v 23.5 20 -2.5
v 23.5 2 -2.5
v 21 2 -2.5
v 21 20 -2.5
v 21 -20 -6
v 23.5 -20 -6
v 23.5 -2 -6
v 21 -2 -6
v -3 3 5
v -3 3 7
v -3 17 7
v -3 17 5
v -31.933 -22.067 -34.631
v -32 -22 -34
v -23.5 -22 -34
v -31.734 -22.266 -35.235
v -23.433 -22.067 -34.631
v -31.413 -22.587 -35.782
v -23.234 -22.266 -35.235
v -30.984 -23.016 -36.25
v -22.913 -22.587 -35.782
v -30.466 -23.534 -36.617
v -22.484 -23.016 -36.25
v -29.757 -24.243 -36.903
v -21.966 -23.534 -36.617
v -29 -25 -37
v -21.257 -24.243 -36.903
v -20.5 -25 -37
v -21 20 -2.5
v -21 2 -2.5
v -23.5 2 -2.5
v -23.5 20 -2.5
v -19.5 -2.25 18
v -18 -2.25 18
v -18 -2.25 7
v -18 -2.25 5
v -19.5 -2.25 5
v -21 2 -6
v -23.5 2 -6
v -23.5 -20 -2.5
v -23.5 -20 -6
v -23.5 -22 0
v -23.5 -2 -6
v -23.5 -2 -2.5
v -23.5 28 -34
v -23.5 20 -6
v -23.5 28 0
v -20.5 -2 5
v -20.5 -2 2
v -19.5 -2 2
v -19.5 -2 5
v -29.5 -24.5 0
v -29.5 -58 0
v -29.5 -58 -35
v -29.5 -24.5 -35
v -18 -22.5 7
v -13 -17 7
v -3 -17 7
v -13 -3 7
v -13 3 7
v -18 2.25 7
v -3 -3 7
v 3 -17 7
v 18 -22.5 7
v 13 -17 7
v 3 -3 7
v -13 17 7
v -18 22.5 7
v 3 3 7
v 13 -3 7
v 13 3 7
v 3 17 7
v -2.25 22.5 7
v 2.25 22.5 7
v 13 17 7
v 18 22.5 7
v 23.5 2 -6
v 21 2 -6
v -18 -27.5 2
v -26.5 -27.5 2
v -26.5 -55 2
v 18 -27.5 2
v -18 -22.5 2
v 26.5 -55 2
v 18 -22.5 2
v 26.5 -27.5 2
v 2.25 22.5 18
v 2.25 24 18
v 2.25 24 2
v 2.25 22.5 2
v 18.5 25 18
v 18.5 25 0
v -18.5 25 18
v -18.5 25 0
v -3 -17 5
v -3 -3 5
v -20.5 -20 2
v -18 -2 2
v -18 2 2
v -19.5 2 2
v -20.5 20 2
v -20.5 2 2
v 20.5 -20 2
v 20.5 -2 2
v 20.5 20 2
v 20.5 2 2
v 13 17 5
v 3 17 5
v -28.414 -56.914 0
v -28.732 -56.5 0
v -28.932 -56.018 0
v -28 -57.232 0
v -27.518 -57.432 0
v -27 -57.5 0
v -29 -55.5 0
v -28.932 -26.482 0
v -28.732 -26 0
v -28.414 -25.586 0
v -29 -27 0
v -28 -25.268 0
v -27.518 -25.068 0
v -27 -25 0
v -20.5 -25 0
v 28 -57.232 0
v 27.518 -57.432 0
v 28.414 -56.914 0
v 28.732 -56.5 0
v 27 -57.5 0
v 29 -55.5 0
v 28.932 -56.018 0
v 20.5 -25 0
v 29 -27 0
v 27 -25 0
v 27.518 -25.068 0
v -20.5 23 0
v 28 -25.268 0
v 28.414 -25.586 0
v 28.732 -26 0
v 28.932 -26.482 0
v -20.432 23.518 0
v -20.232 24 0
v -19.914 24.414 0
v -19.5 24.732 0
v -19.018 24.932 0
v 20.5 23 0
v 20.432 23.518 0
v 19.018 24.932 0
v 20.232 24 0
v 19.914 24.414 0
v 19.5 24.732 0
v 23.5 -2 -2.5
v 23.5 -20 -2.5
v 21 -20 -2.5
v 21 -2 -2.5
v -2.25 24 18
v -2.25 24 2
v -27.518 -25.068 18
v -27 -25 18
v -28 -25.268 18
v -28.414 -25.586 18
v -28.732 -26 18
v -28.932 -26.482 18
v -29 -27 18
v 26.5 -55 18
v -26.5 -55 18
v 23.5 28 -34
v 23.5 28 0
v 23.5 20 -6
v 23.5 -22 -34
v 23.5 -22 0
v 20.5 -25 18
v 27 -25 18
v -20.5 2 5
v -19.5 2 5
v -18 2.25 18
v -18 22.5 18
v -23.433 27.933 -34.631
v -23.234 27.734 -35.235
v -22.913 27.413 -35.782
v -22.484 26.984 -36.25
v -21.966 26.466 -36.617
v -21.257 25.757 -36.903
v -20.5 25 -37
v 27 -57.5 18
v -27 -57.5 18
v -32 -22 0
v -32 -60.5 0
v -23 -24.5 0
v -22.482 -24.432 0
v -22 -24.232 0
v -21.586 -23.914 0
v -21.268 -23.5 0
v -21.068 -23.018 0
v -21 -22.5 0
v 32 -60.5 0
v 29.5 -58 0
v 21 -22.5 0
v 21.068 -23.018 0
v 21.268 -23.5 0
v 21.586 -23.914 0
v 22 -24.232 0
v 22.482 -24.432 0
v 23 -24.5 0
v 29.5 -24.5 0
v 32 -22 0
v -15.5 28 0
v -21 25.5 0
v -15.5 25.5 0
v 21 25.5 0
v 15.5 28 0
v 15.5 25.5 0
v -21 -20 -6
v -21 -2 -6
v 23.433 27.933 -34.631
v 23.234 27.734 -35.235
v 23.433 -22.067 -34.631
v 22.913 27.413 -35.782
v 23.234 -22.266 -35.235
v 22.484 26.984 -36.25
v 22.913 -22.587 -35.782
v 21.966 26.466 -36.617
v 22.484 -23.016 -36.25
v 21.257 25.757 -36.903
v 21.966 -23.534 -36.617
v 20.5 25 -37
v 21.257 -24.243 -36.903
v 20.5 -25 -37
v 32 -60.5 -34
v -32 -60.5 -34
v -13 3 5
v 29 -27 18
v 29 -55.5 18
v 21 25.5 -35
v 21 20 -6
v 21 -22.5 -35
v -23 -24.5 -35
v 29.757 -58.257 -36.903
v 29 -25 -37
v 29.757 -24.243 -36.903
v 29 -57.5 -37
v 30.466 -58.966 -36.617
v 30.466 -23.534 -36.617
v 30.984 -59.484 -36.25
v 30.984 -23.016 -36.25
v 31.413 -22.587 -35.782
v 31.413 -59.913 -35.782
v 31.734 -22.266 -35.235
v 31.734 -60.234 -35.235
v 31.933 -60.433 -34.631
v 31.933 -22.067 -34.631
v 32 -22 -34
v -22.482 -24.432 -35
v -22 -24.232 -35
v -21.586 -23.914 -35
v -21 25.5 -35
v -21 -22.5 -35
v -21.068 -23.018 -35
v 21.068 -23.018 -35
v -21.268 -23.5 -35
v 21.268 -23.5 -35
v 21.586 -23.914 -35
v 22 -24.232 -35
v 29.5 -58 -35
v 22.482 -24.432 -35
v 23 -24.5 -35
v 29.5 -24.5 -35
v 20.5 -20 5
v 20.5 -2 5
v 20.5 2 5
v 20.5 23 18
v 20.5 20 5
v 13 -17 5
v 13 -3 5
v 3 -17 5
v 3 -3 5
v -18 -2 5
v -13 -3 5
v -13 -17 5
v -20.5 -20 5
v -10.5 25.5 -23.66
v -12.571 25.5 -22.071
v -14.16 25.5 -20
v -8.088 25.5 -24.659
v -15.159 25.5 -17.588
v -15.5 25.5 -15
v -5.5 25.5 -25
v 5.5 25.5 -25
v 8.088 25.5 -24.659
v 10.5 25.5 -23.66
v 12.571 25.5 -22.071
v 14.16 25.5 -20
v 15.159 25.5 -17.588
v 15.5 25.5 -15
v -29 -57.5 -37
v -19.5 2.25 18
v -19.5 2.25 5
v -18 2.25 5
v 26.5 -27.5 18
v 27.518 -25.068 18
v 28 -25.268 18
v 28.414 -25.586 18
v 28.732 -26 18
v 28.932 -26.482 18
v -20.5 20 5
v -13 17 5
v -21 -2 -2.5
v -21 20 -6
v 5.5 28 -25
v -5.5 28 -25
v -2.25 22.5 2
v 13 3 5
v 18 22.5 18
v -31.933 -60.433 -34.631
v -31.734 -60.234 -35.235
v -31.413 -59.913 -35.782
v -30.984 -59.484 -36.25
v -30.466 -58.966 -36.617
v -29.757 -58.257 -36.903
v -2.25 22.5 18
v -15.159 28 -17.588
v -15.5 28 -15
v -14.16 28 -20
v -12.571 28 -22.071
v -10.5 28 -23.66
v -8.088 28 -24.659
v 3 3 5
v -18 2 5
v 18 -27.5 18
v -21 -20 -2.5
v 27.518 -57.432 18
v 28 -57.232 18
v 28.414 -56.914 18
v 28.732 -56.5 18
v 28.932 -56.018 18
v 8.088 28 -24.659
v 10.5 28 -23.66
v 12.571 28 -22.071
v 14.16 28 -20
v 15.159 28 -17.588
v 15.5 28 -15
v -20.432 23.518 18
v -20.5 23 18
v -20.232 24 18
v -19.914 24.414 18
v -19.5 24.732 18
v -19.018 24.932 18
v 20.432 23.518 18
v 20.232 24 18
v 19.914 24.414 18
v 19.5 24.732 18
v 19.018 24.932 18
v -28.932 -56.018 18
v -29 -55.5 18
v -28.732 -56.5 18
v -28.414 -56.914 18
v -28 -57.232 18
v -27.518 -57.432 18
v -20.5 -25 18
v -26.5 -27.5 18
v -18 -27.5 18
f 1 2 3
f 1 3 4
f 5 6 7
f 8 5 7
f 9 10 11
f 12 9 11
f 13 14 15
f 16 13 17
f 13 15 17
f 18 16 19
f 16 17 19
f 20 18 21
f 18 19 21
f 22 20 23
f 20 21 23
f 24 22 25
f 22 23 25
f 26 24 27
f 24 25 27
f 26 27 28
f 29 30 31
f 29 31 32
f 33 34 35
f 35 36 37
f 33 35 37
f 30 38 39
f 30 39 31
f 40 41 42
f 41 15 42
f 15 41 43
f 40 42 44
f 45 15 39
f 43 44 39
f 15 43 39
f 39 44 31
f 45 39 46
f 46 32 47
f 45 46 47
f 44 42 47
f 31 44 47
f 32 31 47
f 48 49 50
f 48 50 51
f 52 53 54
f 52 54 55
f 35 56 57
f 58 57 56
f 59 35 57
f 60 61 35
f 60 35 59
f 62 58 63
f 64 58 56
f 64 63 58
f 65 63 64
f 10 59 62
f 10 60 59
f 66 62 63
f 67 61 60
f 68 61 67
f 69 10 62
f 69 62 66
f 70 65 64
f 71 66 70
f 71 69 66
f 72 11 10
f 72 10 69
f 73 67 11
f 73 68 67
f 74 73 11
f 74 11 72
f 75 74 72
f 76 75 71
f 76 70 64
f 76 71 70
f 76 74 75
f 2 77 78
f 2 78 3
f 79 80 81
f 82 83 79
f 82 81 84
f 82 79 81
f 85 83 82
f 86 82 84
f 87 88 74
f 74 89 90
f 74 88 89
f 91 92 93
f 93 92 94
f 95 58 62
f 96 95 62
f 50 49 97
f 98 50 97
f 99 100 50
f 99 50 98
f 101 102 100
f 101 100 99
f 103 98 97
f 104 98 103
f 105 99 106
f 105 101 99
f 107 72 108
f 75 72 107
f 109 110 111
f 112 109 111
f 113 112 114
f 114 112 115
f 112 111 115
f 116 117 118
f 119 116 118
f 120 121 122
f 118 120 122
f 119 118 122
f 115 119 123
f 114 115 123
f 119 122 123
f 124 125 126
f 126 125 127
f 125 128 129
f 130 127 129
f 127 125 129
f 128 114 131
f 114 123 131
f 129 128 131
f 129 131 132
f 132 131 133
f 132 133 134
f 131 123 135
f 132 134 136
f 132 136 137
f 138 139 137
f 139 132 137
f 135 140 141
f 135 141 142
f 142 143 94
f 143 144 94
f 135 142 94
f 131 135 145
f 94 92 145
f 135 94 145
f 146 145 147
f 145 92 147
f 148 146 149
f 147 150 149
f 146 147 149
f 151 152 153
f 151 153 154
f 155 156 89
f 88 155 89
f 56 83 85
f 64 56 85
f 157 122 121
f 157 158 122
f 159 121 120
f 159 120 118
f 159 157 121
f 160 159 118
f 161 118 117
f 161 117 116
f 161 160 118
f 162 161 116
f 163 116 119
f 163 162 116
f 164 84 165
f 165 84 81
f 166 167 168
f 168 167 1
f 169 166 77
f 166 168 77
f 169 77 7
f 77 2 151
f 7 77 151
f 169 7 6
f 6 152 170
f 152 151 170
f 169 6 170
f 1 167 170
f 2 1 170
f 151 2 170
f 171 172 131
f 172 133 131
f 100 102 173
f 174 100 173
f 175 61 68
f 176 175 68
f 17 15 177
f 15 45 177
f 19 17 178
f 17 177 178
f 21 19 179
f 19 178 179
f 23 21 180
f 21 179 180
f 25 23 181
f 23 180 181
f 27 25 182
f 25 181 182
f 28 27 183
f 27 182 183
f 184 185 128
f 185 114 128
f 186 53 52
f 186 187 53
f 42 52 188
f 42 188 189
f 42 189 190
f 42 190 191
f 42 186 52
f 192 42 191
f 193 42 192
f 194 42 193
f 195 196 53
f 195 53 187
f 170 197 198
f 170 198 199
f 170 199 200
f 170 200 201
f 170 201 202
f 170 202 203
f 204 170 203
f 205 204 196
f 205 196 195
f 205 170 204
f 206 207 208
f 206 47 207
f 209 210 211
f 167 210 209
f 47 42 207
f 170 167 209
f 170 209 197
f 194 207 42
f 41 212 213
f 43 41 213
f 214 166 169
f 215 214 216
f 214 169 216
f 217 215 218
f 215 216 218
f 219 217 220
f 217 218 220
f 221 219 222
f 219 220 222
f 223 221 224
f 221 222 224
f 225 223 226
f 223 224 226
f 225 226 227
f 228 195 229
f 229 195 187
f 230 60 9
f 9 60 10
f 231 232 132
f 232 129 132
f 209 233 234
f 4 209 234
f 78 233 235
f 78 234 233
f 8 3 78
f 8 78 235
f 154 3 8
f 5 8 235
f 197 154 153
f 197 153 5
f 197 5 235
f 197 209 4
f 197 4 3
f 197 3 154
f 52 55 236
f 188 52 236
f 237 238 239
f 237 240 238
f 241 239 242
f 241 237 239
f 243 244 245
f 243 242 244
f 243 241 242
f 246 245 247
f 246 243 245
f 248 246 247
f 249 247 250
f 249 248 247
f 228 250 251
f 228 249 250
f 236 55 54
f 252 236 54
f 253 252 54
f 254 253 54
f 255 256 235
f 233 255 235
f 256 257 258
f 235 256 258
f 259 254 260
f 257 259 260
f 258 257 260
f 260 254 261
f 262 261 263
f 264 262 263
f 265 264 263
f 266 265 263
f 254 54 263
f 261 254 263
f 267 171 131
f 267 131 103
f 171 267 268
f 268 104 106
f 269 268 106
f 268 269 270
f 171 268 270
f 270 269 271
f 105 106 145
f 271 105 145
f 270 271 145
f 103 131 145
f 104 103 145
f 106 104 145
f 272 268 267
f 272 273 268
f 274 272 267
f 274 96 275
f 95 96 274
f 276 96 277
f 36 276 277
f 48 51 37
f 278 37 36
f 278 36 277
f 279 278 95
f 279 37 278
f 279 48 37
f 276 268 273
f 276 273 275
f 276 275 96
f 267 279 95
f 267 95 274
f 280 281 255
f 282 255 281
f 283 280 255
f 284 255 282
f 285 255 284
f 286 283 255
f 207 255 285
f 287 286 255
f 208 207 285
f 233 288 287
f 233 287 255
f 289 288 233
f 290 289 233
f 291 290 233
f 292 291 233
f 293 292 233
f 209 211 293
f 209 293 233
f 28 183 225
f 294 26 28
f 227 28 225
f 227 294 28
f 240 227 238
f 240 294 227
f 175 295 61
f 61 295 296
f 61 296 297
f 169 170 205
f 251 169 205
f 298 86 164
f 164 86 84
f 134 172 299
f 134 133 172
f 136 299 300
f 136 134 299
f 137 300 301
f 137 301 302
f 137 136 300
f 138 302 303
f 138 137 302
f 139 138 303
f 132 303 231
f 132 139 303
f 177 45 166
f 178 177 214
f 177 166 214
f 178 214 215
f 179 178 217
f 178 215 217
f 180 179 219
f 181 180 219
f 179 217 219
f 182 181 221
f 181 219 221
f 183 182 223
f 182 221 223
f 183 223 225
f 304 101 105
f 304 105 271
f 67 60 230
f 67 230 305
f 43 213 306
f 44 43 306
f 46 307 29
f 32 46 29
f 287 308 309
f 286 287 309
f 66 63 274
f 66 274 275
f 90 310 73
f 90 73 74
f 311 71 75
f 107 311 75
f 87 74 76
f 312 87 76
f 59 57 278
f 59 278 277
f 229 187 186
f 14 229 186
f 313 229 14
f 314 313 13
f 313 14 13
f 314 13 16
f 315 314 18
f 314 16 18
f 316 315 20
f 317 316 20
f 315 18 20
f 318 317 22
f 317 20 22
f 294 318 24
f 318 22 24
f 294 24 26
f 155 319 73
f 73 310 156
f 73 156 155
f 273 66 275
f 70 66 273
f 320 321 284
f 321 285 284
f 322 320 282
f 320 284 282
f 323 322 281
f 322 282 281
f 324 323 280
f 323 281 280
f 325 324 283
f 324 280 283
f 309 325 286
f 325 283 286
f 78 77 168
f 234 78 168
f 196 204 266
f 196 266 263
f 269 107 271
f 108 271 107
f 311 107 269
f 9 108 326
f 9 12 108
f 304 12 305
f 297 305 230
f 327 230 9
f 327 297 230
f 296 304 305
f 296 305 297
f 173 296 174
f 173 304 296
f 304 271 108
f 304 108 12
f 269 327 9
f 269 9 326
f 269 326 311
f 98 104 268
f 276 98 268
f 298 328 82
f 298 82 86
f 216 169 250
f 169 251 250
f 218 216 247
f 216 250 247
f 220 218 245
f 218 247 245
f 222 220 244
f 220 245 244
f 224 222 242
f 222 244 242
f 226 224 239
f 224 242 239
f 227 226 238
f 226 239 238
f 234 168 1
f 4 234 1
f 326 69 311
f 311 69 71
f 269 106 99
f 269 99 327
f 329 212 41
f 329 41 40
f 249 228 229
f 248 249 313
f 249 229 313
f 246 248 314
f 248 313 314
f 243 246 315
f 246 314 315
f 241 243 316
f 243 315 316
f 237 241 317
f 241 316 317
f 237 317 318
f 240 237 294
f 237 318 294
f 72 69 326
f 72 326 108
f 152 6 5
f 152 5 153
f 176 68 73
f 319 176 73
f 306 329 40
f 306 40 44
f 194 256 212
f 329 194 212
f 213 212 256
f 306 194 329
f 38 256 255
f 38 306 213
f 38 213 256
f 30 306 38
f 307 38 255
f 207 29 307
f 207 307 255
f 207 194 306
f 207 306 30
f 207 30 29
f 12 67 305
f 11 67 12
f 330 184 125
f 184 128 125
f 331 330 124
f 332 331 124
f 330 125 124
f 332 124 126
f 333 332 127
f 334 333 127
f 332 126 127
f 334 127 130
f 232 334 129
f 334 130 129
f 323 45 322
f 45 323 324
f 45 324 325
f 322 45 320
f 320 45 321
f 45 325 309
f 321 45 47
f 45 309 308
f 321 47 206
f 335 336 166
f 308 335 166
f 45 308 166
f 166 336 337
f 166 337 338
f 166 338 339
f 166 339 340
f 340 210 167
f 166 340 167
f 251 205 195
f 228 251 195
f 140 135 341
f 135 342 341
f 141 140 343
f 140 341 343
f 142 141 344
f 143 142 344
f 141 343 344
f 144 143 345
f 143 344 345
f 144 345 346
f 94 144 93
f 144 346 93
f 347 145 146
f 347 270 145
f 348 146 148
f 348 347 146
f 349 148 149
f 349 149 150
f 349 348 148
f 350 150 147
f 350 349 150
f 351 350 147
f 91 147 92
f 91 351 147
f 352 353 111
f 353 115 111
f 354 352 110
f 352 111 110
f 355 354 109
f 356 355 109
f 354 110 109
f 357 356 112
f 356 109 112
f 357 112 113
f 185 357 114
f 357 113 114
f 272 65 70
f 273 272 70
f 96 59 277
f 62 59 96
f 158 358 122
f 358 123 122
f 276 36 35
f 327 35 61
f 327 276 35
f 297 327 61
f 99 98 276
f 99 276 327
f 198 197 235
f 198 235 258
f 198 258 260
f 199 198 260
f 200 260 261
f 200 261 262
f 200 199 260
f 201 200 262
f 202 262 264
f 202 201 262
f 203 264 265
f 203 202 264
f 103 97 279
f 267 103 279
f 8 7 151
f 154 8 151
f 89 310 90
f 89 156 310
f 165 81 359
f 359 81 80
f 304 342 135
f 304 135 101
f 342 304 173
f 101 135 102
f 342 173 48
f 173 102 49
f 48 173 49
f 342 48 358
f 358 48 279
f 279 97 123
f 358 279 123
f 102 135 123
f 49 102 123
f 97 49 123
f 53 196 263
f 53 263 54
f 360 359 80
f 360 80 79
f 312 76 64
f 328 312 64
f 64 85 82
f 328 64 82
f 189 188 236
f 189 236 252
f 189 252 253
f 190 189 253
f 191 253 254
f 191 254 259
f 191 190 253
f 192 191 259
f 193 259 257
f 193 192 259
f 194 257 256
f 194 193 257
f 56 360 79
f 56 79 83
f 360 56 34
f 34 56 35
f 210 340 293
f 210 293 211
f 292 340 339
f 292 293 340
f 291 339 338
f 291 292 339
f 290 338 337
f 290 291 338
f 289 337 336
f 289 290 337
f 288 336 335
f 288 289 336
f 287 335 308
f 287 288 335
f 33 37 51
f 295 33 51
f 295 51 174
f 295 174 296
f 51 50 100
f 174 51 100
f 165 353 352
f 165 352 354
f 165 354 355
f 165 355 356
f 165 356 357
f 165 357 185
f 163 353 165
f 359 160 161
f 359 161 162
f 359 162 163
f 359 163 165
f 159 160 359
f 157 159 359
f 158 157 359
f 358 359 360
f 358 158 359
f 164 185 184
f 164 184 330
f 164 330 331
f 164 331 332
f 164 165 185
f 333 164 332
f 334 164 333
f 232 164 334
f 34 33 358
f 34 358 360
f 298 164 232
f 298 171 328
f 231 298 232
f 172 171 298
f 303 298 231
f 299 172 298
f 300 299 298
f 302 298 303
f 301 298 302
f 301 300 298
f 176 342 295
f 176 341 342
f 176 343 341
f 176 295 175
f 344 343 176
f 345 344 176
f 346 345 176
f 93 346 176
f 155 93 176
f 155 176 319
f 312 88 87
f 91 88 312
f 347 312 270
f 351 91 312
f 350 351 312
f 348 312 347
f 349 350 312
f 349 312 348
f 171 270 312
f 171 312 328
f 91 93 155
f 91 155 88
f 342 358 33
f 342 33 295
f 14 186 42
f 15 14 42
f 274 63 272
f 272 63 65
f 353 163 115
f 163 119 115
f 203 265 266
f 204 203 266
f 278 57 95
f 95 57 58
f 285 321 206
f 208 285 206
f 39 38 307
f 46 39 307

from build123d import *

# Parameters (mm, degrees)
F1_DEPTH  = 2
F2_DEPTH  = 18
F3_W      = 36
F3_H      = 45
F4_DEPTH  = 5
F5_W      = 18
F5_H      = 3
F6_DEPTH  = 41
F7_W      = 10
F7_H      = 14
F8_DEPTH  = 3
F9_DEPTH  = 35
F11_DEPTH = 2
F12_R     = 3
F13_R     = 2
F14_W     = 31
F14_H     = 25
F15_DEPTH = 2.5
F16_W     = 18
F16_H     = 3.5
F17_DEPTH = 47
F18_R     = 10


with BuildPart() as f1:
    # F0 (on Top) → F1 (new body)
    with BuildSketch(Plane.XY):
        Polygon((20.5, -25), (20.5, 25), (-20.5, 25), (-20.5, -25), (-29, -25), (-29, -57.5), (29, -57.5), (29, -25), align=None)
        Polygon((2.25, 22.5), (18, 22.5), (18, -27.5), (26.5, -27.5), (26.5, -55), (-26.5, -55), (-26.5, -27.5), (-18, -27.5), (-18, -2.25), (-19.5, -2.25), (-19.5, 2.25), (-18, 2.25), (-18, 22.5), (-2.25, 22.5), (-2.25, 24), (2.25, 24), align=None, mode=Mode.SUBTRACT)
        Polygon((18, -27.5), (18, 22.5), (2.25, 22.5), (2.25, 24), (-2.25, 24), (-2.25, 22.5), (-18, 22.5), (-18, 2.25), (-19.5, 2.25), (-19.5, -2.25), (-18, -2.25), (-18, -27.5), (-26.5, -27.5), (-26.5, -55), (26.5, -55), (26.5, -27.5), align=None)
    extrude(amount=F1_DEPTH)

    # F0 (on Top) → F2 (join)
    with BuildSketch(Plane.XY):
        Polygon((20.5, -25), (20.5, 25), (-20.5, 25), (-20.5, -25), (-29, -25), (-29, -57.5), (29, -57.5), (29, -25), align=None)
        Polygon((2.25, 22.5), (18, 22.5), (18, -27.5), (26.5, -27.5), (26.5, -55), (-26.5, -55), (-26.5, -27.5), (-18, -27.5), (-18, -2.25), (-19.5, -2.25), (-19.5, 2.25), (-18, 2.25), (-18, 22.5), (-2.25, 22.5), (-2.25, 24), (2.25, 24), align=None, mode=Mode.SUBTRACT)
    extrude(amount=F2_DEPTH)

    # F3 (on face) → F4 (join)
    with BuildSketch(Plane.XY.offset(2)):
        Rectangle(F3_W, F3_H)
    extrude(amount=F4_DEPTH)

    # F5 (on face) → F6 (cut, through all)
    with BuildSketch(Plane(origin=(-20.5, 0, 0), x_dir=(0, -1, 0), z_dir=(-1, 0, 0))):
        with Locations((11, 3.5)):
            Rectangle(F5_W, F5_H)
        with Locations((-11, 3.5)):
            Rectangle(F5_W, F5_H)
    extrude(amount=-F6_DEPTH, mode=Mode.SUBTRACT)

    # F7 (on face) → F8 (cut)
    with BuildSketch(Plane.XY.offset(7)):
        with Locations((-8, 10)):
            Rectangle(F7_W, F7_H)
        with Locations((8, 10)):
            Rectangle(F7_W, F7_H)
        with Locations((-8, -10)):
            Rectangle(F7_W, F7_H)
        with Locations((8, -10)):
            Rectangle(F7_W, F7_H)
    extrude(amount=-F8_DEPTH, mode=Mode.SUBTRACT)

    # F13
    f13_edges = [f1.edges().sort_by_distance(p)[0] for p in [
        (-29, -57.5, 9),
        (-29, -25, 9),
        (29, -57.5, 9),
        (-20.5, 25, 9),
        (29, -25, 9),
        (20.5, 25, 9),
    ]]
    fillet(f13_edges, radius=F13_R)


with BuildPart() as f9:
    # F0 (on Top) → F9 (new body)
    with BuildSketch(Plane.XY):
        Polygon((-23.5, -22), (-32, -22), (-32, -60.5), (32, -60.5), (32, -22), (23.5, -22), (23.5, 28), (-23.5, 28), align=None)
        with BuildLine():
            Line((-29.5, -58), (-29.5, -24.5))
            Line((-29.5, -24.5), (-23, -24.5))
            ThreePointArc((-23, -24.5), (-21.585786, -23.914214), (-21, -22.5))
            Line((-21, -22.5), (-21, 25.5))
            Line((-21, 25.5), (21, 25.5))
            Line((21, 25.5), (21, -22.5))
            ThreePointArc((21, -22.5), (21.585786, -23.914214), (23, -24.5))
            Line((23, -24.5), (29.5, -24.5))
            Line((29.5, -24.5), (29.5, -58))
            Line((29.5, -58), (-29.5, -58))
        make_face(mode=Mode.SUBTRACT)
    extrude(amount=-F9_DEPTH)

    # F10 (on face) → F11 (join)
    with BuildSketch(Plane(origin=(0, 0, -35), x_dir=(1, 0, 0), z_dir=(0, 0, -1))):
        Polygon((32, 60.5), (-32, 60.5), (-32, 22), (-23.5, 22), (-23.5, -28), (23.5, -28), (23.5, 22), (32, 22), align=None)
    extrude(amount=F11_DEPTH)

    # F12
    f12_edges = [f9.edges().sort_by_distance(p)[0] for p in [
        (0, -60.5, -37),
        (-32, -41.25, -37),
        (-27.75, -22, -37),
        (-23.5, 3, -37),
        (0, 28, -37),
        (23.5, 3, -37),
        (27.75, -22, -37),
        (32, -41.25, -37),
    ]]
    fillet(f12_edges, radius=F12_R)

    # F14 (on face) → F15 (cut, through all)
    with BuildSketch(Plane(origin=(0, 28, 0), x_dir=(-1, 0, 0), z_dir=(0, 1, 0))):
        with Locations((0, -12.5)):
            Rectangle(F14_W, F14_H)
    extrude(amount=-F15_DEPTH, mode=Mode.SUBTRACT)

    # F16 (on face) → F17 (cut, through all)
    with BuildSketch(Plane.YZ.offset(23.5)):
        with Locations((-11, -4.25)):
            Rectangle(F16_W, F16_H)
        with Locations((11, -4.25)):
            Rectangle(F16_W, F16_H)
    extrude(amount=-F17_DEPTH, mode=Mode.SUBTRACT)

    # F18
    f18_edges = [f9.edges().sort_by_distance(p)[0] for p in [
        (15.5, 26.75, -25),
        (-15.5, 26.75, -25),
    ]]
    fillet(f18_edges, radius=F18_R)


solid = Compound([f1.part, f9.part])
